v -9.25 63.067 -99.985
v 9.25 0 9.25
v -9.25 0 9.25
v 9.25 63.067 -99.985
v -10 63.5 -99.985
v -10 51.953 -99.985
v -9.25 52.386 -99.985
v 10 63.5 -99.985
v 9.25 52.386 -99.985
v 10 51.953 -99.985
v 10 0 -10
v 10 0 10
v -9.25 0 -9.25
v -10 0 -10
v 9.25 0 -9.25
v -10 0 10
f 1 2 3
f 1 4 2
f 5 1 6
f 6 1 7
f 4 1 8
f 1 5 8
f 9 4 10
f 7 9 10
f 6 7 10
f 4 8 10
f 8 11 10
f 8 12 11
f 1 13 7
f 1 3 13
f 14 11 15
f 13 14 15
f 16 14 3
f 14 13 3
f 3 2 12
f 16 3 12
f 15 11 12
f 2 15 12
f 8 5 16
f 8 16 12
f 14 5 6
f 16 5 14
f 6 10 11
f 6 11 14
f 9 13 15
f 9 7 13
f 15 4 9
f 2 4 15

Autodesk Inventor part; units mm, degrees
ref_plane "YZ Plane" through (0, 0, 0) normal (1, 0, 0) x (0, 1, 0)
ref_plane "XZ Plane" through (0, 0, 0) normal (0, 1, 0) x (-1, 0, 0)
ref_plane "XY Plane" through (0, 0, 0) normal (0, 0, 1) x (1, 0, 0)
sketch "Эскиз4" plane through (0, 0, 0) normal (0, 1, 0) x (-1, 0, 0)
  line L0 (-10, -10) -> (10, -10)
  line L1 (10, -10) -> (10, 10)
  line L2 (10, 10) -> (-10, 10)
  line L3 (-10, 10) -> (-10, -10)
  line L4 (-10, -10) -> (10, 10) construction
  line L5 (10, -10) -> (-10, 10) construction
  line L6 (-9.25, -9.25) -> (9.25, -9.25)
  line L7 (9.25, -9.25) -> (9.25, 9.25)
  line L8 (9.25, 9.25) -> (-9.25, 9.25)
  line L9 (-9.25, 9.25) -> (-9.25, -9.25)
  line L10 (-9.25, -9.25) -> (9.25, 9.25) construction
  line L11 (9.25, -9.25) -> (-9.25, 9.25) construction
  point P0 (0, 0)
  dimension "d11" = 20
  dimension "d12" = 20
  dimension "d13" = 18.5
  dimension "d14" = 18.5
sketch "Эскиз5" plane through (0, 0, 0) normal (1, 0, 0) x (0, 1, 0)
  line L0 (0, 0) -> (63.5, -109.9852)
  line L1 (0, 0) -> (127, 0) construction
  dimension "d15" = 127
  dimension "d16" = 60
sweep "Сдвиг1" add profiles "Эскиз4" path "Эскиз5"
sketch "Эскиз6" plane through (10, 0, 10) normal (1, 0, 0) x (0, 0, -1)
  line L0 (109.9852, 63.5) -> (119.9852, 57.7265)
  line L1 (20, 0) -> (129.9852, 63.5) projected
  line L2 (109.9852, 63.5) -> (121.5322, 63.5) construction
  line L3 (119.9852, 57.7265) -> (129.9852, 63.5)
  line L4 (129.9852, 63.5) -> (109.9852, 63.5)
  line L5 (129.2352, 63.5) -> (110.7352, 63.5) projected
  point P0 (10, 0)
  dimension "d19" = 30
extrude "Выдавливание3" cut sketch "Эскиз6" against normal blind 127.0171
sketch "Эскиз7" plane through (10, 0, 10) normal (1, 0, 0) x (0, 0, -1)
  line L0 (0, 0) -> (109.9852, 63.5) projected
  line L1 (109.9852, 63.5) -> (109.9852, 51.953)
  line L2 (20, 0) -> (119.9852, 57.7265) projected
  line L3 (109.9852, 63.5) -> (119.9852, 57.7265)
  line L4 (109.9852, 51.953) -> (109.9852, 51.4136)
  line L5 (109.9852, 51.4136) -> (120.7731, 57.642)
  line L6 (20, 0) -> (119.9852, 57.7265) projected
  line L7 (119.9852, 57.7265) -> (120.7731, 57.2716)
  point P0 (10, 0)
  point P1 (120.4523, 57.4568)
extrude "Выдавливание4" cut sketch "Эскиз7" against normal blind 127.0171
properties part number "КРЫШАДЕТАЛЬXI"
